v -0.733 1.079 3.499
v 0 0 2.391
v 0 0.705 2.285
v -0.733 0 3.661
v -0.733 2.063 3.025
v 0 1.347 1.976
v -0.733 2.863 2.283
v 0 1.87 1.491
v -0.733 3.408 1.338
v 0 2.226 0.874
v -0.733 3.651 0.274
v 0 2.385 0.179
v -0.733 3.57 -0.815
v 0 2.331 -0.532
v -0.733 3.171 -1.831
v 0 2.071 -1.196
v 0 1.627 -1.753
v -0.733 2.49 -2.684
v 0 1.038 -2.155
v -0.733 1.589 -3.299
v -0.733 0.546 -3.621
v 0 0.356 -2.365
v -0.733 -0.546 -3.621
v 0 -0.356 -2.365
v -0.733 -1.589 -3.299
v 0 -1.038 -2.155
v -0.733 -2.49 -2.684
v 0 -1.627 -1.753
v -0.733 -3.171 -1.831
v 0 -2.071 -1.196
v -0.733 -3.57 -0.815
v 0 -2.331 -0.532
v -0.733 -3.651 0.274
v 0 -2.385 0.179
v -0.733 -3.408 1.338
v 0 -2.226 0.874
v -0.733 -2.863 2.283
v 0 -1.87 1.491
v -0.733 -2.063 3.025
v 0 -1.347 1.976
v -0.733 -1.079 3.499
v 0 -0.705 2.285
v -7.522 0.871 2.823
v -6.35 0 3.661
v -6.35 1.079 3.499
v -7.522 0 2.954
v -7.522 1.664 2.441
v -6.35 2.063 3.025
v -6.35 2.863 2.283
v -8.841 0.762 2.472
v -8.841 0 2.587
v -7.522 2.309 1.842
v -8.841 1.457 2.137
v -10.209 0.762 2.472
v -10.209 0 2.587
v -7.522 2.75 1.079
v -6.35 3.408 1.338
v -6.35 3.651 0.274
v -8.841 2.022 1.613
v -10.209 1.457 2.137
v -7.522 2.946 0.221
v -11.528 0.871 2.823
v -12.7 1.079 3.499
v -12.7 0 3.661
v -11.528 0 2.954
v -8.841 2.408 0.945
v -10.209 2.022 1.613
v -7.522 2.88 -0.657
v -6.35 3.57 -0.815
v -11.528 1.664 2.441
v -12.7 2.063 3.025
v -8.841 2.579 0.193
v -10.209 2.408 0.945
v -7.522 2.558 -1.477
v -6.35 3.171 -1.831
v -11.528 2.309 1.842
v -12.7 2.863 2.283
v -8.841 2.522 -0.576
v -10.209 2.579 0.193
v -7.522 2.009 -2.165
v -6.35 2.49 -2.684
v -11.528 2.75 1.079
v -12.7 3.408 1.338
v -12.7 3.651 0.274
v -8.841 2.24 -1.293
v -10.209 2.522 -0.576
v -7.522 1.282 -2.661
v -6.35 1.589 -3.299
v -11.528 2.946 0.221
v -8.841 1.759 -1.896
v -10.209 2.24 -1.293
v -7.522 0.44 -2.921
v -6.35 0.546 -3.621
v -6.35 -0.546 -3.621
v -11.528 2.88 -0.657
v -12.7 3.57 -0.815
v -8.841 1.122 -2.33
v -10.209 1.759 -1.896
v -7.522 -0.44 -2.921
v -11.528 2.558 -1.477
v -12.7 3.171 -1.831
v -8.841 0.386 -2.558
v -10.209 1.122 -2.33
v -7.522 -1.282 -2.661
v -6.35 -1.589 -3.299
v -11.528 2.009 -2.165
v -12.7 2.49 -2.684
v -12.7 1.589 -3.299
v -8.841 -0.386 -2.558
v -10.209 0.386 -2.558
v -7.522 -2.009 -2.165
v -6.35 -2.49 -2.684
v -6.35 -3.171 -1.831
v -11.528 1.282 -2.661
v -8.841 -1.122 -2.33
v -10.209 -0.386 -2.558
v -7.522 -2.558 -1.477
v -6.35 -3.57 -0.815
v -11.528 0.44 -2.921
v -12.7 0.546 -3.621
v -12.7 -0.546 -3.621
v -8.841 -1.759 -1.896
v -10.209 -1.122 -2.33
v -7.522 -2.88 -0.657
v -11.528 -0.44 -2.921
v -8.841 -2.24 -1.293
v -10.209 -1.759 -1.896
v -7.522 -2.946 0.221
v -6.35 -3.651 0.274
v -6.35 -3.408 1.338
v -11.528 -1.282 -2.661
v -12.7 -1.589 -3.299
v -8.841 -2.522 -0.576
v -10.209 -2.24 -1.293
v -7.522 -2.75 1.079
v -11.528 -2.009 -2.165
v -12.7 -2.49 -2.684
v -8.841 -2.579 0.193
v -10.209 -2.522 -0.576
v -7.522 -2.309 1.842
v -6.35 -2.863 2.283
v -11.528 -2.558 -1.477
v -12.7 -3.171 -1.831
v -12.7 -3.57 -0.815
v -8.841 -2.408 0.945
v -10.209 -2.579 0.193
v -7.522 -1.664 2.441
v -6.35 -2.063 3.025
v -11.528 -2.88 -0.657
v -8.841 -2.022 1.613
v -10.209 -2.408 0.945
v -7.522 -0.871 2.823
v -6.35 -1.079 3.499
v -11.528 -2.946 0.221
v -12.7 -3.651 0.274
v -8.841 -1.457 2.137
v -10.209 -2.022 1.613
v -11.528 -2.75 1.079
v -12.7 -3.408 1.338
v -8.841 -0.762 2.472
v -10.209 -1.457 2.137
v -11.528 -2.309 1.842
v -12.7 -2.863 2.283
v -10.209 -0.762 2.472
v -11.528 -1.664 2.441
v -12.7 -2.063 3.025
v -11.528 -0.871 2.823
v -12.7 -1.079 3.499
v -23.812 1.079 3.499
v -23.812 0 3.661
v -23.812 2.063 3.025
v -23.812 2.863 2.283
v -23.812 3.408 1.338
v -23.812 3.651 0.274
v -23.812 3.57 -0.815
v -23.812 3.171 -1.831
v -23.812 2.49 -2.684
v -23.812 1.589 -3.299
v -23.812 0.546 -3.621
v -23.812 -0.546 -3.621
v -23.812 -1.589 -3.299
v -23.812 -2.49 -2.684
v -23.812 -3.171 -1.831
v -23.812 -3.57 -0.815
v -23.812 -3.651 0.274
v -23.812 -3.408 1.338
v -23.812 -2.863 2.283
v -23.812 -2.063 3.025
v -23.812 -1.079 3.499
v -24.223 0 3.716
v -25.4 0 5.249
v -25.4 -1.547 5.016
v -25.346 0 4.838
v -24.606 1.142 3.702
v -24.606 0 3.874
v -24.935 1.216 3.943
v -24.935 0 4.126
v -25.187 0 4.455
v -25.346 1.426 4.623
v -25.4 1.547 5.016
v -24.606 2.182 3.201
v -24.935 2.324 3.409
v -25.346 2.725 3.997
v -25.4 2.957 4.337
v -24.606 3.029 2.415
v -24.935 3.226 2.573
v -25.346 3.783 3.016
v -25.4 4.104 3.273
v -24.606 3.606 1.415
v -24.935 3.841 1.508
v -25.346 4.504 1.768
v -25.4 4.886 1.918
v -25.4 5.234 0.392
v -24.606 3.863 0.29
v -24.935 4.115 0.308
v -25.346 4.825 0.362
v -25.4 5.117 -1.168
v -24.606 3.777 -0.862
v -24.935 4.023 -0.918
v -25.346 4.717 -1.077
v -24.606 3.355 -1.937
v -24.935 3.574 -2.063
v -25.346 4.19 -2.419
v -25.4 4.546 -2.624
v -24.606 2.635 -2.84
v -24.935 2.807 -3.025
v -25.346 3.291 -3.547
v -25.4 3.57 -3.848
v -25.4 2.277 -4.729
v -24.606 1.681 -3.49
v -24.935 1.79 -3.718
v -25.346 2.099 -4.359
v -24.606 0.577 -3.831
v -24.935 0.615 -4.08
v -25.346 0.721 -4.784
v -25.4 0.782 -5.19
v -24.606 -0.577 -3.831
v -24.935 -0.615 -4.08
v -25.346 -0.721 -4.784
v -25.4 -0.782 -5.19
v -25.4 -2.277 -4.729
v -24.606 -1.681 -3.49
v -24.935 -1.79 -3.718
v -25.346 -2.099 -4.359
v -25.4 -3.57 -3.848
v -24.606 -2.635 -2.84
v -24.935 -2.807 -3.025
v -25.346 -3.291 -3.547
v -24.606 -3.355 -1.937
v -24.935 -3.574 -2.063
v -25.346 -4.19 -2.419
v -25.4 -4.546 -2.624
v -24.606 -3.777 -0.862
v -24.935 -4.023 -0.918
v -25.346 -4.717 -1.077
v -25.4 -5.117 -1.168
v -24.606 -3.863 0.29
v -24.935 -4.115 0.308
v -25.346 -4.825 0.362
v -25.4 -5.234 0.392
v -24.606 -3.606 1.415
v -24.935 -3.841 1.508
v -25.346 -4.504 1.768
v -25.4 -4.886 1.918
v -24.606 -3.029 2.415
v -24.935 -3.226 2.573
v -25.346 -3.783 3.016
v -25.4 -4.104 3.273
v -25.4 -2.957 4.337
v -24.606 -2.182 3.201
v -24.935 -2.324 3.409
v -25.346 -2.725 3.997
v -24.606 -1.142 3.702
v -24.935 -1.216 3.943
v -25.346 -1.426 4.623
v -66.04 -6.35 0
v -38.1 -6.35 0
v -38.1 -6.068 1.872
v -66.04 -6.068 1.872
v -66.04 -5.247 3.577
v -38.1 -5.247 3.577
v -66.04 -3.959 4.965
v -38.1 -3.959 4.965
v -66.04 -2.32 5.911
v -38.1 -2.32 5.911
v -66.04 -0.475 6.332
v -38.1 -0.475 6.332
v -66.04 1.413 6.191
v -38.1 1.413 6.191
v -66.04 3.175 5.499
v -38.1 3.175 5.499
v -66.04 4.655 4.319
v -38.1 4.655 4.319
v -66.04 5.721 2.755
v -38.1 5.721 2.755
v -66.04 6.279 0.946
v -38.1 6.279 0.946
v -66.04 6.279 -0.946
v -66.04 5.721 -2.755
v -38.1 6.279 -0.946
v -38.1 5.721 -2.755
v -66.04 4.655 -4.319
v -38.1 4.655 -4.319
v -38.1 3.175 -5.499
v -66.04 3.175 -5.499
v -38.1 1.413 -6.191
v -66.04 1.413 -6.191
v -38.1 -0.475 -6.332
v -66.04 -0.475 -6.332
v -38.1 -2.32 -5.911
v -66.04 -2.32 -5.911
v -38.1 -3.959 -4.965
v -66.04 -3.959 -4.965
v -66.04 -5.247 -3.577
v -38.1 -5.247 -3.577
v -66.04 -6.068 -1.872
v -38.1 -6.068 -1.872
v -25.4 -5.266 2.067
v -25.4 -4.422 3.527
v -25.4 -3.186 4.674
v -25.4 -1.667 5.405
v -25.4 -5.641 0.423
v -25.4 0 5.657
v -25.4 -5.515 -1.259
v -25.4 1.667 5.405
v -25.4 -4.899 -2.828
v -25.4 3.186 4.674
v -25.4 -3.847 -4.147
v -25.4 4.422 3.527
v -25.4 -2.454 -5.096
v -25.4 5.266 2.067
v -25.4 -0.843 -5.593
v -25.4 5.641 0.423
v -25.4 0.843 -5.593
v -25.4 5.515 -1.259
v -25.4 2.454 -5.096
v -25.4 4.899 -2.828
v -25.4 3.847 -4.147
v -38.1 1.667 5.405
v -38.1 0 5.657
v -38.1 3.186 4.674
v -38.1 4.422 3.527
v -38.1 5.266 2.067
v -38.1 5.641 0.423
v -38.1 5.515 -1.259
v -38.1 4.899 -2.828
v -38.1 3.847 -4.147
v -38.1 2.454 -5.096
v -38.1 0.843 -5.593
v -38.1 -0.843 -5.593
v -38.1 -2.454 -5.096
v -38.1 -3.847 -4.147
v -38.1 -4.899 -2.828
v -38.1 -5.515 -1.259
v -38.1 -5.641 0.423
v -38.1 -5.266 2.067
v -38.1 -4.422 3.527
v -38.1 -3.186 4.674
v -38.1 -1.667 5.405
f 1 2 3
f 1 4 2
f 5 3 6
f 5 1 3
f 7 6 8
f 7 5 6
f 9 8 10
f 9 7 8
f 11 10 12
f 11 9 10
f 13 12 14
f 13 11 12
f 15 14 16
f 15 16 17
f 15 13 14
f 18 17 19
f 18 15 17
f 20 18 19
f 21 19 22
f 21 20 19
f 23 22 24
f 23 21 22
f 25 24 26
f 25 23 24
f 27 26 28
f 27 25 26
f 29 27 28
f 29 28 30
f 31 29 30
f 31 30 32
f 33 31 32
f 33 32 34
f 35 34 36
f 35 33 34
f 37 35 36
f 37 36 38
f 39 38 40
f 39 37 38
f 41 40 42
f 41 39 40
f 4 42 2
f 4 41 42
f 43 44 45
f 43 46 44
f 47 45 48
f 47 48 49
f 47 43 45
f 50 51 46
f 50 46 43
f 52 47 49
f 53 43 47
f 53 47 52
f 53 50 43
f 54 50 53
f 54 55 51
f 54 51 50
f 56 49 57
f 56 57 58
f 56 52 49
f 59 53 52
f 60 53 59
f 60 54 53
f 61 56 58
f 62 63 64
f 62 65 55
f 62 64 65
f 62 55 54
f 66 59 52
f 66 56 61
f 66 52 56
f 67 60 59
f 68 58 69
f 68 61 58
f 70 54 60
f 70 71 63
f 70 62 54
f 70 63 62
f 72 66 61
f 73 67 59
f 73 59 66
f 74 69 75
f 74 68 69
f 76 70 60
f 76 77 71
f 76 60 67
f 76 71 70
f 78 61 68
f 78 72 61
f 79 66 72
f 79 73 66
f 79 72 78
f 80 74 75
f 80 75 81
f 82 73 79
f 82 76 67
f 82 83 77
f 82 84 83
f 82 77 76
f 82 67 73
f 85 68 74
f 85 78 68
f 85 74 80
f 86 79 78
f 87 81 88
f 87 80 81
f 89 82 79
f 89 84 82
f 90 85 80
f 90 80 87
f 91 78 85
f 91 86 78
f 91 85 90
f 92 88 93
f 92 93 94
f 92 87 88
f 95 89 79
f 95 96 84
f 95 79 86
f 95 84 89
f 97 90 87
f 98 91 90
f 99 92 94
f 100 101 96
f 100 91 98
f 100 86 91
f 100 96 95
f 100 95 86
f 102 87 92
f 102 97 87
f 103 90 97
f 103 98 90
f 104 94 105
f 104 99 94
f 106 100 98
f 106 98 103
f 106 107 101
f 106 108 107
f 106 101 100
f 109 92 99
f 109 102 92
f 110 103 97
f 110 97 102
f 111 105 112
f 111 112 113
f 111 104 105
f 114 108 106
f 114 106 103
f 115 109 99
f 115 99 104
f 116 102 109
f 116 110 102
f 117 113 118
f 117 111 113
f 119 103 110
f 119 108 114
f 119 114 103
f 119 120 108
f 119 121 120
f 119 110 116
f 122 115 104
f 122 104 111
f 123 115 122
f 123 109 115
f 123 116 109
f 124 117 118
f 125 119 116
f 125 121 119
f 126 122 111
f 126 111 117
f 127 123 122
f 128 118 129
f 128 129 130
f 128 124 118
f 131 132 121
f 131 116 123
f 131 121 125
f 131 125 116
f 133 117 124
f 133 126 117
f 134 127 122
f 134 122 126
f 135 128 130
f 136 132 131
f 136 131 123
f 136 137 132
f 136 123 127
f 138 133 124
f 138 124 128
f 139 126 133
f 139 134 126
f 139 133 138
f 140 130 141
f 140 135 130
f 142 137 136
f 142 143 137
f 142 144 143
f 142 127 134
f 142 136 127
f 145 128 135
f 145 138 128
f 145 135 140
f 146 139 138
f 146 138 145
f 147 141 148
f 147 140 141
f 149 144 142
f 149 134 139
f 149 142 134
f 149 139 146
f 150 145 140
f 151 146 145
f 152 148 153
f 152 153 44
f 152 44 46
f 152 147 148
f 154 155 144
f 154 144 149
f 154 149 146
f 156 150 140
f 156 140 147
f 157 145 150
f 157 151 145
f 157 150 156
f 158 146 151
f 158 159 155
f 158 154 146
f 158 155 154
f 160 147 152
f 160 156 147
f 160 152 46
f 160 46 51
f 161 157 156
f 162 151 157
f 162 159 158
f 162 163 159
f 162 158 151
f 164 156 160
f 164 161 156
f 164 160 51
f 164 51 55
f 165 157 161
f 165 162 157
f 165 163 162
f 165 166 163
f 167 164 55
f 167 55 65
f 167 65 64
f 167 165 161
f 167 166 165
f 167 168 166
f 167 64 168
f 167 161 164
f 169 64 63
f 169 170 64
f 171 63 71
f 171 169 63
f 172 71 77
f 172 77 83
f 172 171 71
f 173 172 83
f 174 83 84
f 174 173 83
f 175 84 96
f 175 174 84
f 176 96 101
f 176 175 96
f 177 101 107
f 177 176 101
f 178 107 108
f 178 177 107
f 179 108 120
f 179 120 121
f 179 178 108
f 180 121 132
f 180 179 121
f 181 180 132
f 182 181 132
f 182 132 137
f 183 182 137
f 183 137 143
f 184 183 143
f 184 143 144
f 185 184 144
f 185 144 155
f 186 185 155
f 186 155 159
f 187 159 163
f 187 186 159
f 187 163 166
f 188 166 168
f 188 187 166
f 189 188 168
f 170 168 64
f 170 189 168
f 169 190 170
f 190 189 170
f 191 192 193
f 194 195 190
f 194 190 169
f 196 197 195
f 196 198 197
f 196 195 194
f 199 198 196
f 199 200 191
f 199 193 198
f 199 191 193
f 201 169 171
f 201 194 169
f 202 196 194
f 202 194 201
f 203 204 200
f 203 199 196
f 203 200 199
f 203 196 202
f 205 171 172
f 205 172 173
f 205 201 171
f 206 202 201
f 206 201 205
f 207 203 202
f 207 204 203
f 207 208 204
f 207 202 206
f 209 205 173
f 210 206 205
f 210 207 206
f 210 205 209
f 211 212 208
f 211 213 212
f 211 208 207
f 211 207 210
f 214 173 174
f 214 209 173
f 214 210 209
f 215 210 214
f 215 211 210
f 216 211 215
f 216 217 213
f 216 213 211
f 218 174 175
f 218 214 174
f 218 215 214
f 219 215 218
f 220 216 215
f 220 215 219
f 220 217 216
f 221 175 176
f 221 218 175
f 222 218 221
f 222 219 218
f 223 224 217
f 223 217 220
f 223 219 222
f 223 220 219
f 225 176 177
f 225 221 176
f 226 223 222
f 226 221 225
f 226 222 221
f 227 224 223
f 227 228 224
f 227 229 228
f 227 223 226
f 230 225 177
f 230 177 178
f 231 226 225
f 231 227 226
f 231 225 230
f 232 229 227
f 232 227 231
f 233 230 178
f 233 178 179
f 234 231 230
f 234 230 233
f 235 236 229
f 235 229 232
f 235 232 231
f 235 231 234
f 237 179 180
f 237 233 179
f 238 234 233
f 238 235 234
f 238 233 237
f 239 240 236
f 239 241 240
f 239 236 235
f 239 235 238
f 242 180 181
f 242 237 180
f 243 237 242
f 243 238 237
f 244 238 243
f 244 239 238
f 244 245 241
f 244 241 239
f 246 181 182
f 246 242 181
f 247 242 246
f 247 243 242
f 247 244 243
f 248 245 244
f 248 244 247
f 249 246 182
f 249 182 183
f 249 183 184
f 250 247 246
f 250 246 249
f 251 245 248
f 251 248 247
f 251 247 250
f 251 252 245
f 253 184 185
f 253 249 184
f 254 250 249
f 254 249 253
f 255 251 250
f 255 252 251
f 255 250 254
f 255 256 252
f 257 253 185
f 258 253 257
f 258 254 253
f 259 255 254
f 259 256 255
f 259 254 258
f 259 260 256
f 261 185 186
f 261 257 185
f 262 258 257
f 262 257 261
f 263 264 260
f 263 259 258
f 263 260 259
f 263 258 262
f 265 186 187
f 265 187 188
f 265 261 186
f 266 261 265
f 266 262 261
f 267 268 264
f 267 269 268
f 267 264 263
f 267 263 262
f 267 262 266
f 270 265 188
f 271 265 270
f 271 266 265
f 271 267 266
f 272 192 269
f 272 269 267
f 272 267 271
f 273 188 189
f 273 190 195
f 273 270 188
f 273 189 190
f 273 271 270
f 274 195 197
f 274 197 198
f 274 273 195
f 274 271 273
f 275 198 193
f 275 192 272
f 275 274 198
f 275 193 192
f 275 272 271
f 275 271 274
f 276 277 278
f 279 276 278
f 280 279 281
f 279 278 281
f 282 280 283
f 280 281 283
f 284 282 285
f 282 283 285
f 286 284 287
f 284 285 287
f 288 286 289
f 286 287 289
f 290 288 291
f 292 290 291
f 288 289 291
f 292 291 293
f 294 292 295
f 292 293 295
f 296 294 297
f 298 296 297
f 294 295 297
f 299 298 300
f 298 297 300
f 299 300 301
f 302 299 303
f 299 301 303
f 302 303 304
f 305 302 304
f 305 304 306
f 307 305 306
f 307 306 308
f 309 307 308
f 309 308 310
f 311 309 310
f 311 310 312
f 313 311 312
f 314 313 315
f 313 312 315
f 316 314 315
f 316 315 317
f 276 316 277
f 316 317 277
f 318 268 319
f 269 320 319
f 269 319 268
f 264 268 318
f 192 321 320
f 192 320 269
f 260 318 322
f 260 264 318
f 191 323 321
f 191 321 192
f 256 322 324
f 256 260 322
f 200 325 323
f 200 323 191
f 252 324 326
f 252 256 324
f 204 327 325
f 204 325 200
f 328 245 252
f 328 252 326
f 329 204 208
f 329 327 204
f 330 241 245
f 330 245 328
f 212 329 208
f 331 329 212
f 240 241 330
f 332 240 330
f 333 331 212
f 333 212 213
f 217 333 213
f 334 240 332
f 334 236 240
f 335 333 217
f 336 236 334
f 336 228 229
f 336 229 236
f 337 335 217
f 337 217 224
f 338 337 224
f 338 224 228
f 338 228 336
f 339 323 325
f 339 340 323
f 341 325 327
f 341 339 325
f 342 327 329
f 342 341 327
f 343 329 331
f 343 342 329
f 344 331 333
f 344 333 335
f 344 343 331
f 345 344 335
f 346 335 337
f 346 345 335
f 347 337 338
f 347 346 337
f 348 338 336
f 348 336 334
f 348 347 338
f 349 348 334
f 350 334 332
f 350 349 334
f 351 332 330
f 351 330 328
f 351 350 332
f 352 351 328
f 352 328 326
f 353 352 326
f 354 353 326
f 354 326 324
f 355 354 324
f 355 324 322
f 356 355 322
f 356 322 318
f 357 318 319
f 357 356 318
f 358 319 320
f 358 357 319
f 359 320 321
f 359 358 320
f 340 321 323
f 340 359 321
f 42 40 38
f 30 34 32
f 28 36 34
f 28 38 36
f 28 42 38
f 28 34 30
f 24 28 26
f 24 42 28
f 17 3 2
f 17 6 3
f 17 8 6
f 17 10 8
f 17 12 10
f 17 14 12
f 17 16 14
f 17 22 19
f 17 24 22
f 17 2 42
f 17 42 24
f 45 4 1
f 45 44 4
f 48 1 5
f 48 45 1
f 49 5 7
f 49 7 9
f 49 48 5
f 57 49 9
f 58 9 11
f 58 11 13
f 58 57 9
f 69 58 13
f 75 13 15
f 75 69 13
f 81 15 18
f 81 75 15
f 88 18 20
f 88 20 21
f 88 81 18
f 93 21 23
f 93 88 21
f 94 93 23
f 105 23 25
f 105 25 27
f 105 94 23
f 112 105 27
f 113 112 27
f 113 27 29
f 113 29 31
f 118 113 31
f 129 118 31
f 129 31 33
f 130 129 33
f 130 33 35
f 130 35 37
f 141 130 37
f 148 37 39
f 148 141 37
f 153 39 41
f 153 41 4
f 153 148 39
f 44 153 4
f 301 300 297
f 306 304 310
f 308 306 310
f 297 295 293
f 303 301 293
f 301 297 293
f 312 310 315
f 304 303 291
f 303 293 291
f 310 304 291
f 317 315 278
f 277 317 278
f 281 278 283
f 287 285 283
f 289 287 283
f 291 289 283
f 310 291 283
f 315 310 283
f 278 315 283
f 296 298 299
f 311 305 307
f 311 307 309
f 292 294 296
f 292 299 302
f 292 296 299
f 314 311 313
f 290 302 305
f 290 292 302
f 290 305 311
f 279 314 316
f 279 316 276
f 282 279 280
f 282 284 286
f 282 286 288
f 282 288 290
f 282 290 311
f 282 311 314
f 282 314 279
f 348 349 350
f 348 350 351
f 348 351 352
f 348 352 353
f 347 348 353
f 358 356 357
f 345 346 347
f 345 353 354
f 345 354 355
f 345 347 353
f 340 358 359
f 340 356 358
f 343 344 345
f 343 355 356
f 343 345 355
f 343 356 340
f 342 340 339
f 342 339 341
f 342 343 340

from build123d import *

# Parameters (mm, degrees)
F2_R     = 6.35
F3_DEPTH = 27.94


with BuildPart() as f1:
    # F0 (on Front) → F1 (revolve)
    with BuildSketch(Plane.XZ):
        with BuildLine():
            Line((0, 2.39141), (-0.7332348419, 3.66141))
            Line((-0.7332348419, 3.66141), (-6.35, 3.66141))
            ThreePointArc((-6.35, 3.66141), (-9.525, 2.54), (-12.7, 3.66141))
            Line((-12.7, 3.66141), (-23.8125, 3.66141))
            ThreePointArc((-23.8125, 3.66141), (-24.9350320151, 4.1263779849), (-25.4, 5.24891))
            Line((-25.4, 5.24891), (-25.4, 5.65658))
            Line((-25.4, 5.65658), (-38.1, 5.65658))
            Line((-38.1, 5.65658), (-38.1, 0))
            Line((-38.1, 0), (0, 0))
            Line((0, 0), (0, 2.39141))
        make_face()
    revolve(axis=Axis((-19.05, 0, 0), (-1, 0, 0)))


with BuildPart() as f3:
    # F2 (on face) → F3 (new body)
    with BuildSketch(Plane(origin=(-38.1, 0, 0), x_dir=(0, -1, 0), z_dir=(-1, 0, 0))):
        Circle(F2_R)
    extrude(amount=F3_DEPTH)


solid = Compound([f1.part, f3.part])
